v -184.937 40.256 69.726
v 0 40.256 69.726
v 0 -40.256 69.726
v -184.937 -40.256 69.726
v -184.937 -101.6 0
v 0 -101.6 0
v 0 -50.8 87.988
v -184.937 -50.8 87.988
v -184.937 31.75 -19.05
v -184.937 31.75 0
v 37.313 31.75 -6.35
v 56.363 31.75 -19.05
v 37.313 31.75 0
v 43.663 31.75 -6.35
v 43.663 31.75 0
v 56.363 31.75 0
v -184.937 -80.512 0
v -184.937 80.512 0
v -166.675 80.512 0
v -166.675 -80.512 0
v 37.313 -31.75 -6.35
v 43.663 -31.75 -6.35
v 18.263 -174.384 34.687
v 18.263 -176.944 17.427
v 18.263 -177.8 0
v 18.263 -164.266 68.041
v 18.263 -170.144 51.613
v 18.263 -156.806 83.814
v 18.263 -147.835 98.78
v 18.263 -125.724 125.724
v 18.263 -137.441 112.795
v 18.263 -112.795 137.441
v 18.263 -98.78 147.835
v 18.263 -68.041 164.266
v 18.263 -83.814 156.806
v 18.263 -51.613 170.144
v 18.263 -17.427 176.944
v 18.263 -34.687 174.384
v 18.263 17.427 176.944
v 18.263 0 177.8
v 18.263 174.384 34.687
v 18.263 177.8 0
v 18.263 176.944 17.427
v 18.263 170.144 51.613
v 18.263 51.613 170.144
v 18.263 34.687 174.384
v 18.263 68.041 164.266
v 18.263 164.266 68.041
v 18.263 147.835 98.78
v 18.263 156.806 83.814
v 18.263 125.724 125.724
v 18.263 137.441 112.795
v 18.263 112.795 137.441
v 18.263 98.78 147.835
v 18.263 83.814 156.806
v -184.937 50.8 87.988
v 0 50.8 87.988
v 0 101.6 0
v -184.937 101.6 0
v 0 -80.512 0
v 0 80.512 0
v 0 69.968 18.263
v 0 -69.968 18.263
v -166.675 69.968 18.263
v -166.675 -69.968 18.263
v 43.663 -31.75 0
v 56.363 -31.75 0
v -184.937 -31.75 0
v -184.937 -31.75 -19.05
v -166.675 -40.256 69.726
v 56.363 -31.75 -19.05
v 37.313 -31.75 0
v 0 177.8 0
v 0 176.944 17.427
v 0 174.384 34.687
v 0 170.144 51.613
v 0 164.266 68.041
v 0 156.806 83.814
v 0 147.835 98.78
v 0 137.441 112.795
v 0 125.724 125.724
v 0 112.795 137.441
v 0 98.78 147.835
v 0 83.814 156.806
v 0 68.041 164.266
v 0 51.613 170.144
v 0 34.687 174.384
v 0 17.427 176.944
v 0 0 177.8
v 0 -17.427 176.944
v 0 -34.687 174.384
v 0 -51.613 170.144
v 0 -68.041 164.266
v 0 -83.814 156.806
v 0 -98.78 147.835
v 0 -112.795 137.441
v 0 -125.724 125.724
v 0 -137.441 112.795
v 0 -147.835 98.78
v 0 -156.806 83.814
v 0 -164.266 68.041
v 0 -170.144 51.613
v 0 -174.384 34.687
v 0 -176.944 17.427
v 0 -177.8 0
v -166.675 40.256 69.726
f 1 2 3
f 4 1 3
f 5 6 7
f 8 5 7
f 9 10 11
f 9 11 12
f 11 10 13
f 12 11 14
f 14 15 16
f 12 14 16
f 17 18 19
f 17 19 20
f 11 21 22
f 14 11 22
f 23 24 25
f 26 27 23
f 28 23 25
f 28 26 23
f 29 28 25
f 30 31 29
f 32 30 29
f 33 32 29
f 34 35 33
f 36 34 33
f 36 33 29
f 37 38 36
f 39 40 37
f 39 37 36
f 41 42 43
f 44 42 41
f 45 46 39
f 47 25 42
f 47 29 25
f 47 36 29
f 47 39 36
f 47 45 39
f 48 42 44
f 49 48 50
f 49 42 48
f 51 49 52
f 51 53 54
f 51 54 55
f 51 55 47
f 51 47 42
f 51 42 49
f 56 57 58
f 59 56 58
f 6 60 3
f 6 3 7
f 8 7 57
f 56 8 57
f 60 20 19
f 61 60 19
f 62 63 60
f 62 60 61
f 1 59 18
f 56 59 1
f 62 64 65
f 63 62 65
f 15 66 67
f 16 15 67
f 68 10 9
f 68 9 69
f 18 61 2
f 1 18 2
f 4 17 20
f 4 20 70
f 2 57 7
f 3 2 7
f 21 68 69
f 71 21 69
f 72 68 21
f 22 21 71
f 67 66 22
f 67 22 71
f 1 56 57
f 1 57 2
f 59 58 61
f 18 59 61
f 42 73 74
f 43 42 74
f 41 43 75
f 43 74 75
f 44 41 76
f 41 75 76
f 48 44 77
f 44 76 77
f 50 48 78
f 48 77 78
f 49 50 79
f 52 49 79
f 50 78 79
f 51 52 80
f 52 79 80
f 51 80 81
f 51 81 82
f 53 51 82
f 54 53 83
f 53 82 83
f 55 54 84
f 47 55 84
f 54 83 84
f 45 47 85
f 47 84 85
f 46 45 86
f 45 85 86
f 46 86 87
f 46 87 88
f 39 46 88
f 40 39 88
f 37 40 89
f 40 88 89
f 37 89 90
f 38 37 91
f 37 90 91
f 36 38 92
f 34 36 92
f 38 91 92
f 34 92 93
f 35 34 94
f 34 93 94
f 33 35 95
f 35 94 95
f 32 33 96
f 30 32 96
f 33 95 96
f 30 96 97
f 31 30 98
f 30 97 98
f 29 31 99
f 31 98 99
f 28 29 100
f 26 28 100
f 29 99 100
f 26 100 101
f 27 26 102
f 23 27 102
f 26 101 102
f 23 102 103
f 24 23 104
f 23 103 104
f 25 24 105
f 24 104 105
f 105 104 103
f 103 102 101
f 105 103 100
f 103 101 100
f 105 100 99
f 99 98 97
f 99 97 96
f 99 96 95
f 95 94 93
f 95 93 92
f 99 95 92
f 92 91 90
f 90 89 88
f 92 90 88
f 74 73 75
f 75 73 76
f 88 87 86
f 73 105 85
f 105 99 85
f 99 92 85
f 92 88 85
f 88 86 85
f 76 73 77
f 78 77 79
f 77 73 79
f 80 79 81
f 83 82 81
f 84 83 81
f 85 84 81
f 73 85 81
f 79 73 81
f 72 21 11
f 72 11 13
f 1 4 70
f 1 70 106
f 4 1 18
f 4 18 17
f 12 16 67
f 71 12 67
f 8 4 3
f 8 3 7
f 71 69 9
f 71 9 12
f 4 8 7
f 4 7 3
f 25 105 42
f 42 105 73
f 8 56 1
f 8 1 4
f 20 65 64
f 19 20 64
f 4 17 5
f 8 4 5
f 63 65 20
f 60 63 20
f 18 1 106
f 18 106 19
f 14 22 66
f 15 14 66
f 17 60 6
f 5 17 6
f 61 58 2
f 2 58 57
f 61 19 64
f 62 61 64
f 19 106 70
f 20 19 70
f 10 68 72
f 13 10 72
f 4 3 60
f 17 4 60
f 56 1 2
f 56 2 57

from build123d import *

# Parameters (mm, degrees)
F1_DEPTH  = 18.2626
F4_DEPTH  = 184.9374
F5_DEPTH  = 184.9374
F7_DEPTH  = 18.2626
F9_DEPTH  = 166.6748
F10_W     = 241.3
F10_H     = 63.5
F11_DEPTH = 19.05
F12_W     = 6.35
F12_H     = 6.35
F13_DEPTH = 209.551


with BuildPart() as f1:
    # F0 (on Right) → F1 (new body)
    with BuildSketch(Plane.YZ):
        with BuildLine():
            Line((-177.8, 0), (177.8, 0))
            ThreePointArc((177.8, 0), (0, 177.8), (-177.8, 0))
        make_face()
    extrude(amount=F1_DEPTH)


with BuildPart() as f4:
    # F2 (on face) → F4 (new body, through all)
    with BuildSketch(Plane(origin=(0, 0, 0), x_dir=(0, -1, 0), z_dir=(-1, 0, 0))):
        Polygon((-80.512166, 0), (-40.256083, 69.725581), (-50.8, 87.988181), (-101.6, 0), align=None)
        Polygon((40.256083, 69.725581), (80.512166, 0), (101.6, 0), (50.8, 87.988181), align=None)
    extrude(amount=F4_DEPTH)


with BuildPart() as f5:
    # F2 (on face) → F5 (new body, through all)
    with BuildSketch(Plane(origin=(0, 0, 0), x_dir=(0, -1, 0), z_dir=(-1, 0, 0))):
        Polygon((-50.8, 87.988181), (-40.256083, 69.725581), (40.256083, 69.725581), (50.8, 87.988181), align=None)
    extrude(amount=F5_DEPTH)


with BuildPart() as f7:
    # F6 (on face) → F7 (new body)
    with BuildSketch(Plane(origin=(-184.9374, 0, 0), x_dir=(0, -1, 0), z_dir=(-1, 0, 0))):
        Polygon((40.256083, 69.725581), (-40.256083, 69.725581), (-80.512166, 0), (80.512166, 0), align=None)
    extrude(amount=-F7_DEPTH)


with BuildPart() as f9:
    # F8 (on face) → F9 (new body, through all)
    with BuildSketch(Plane.YZ.offset(-166.6748)):
        Polygon((-69.968249, 18.2626), (-80.512166, 0), (80.512166, 0), (69.968249, 18.2626), align=None)
    extrude(amount=F9_DEPTH)


with BuildPart() as f11:
    # F10 (on face) → F11 (new body)
    with BuildSketch(Plane(origin=(0, 0, 0), x_dir=(1, 0, 0), z_dir=(0, 0, -1))):
        with Locations((-64.2874, 0)):
            Rectangle(F10_W, F10_H)
    extrude(amount=F11_DEPTH)

    # F12 (on face) → F13 (cut, through all)
    with BuildSketch(Plane.XZ.offset(31.75)):
        with Locations((40.4876, -3.175)):
            Rectangle(F12_W, F12_H)
    extrude(amount=-F13_DEPTH, mode=Mode.SUBTRACT)


solid = Compound([f1.part, f4.part, f5.part, f7.part, f9.part, f11.part])
